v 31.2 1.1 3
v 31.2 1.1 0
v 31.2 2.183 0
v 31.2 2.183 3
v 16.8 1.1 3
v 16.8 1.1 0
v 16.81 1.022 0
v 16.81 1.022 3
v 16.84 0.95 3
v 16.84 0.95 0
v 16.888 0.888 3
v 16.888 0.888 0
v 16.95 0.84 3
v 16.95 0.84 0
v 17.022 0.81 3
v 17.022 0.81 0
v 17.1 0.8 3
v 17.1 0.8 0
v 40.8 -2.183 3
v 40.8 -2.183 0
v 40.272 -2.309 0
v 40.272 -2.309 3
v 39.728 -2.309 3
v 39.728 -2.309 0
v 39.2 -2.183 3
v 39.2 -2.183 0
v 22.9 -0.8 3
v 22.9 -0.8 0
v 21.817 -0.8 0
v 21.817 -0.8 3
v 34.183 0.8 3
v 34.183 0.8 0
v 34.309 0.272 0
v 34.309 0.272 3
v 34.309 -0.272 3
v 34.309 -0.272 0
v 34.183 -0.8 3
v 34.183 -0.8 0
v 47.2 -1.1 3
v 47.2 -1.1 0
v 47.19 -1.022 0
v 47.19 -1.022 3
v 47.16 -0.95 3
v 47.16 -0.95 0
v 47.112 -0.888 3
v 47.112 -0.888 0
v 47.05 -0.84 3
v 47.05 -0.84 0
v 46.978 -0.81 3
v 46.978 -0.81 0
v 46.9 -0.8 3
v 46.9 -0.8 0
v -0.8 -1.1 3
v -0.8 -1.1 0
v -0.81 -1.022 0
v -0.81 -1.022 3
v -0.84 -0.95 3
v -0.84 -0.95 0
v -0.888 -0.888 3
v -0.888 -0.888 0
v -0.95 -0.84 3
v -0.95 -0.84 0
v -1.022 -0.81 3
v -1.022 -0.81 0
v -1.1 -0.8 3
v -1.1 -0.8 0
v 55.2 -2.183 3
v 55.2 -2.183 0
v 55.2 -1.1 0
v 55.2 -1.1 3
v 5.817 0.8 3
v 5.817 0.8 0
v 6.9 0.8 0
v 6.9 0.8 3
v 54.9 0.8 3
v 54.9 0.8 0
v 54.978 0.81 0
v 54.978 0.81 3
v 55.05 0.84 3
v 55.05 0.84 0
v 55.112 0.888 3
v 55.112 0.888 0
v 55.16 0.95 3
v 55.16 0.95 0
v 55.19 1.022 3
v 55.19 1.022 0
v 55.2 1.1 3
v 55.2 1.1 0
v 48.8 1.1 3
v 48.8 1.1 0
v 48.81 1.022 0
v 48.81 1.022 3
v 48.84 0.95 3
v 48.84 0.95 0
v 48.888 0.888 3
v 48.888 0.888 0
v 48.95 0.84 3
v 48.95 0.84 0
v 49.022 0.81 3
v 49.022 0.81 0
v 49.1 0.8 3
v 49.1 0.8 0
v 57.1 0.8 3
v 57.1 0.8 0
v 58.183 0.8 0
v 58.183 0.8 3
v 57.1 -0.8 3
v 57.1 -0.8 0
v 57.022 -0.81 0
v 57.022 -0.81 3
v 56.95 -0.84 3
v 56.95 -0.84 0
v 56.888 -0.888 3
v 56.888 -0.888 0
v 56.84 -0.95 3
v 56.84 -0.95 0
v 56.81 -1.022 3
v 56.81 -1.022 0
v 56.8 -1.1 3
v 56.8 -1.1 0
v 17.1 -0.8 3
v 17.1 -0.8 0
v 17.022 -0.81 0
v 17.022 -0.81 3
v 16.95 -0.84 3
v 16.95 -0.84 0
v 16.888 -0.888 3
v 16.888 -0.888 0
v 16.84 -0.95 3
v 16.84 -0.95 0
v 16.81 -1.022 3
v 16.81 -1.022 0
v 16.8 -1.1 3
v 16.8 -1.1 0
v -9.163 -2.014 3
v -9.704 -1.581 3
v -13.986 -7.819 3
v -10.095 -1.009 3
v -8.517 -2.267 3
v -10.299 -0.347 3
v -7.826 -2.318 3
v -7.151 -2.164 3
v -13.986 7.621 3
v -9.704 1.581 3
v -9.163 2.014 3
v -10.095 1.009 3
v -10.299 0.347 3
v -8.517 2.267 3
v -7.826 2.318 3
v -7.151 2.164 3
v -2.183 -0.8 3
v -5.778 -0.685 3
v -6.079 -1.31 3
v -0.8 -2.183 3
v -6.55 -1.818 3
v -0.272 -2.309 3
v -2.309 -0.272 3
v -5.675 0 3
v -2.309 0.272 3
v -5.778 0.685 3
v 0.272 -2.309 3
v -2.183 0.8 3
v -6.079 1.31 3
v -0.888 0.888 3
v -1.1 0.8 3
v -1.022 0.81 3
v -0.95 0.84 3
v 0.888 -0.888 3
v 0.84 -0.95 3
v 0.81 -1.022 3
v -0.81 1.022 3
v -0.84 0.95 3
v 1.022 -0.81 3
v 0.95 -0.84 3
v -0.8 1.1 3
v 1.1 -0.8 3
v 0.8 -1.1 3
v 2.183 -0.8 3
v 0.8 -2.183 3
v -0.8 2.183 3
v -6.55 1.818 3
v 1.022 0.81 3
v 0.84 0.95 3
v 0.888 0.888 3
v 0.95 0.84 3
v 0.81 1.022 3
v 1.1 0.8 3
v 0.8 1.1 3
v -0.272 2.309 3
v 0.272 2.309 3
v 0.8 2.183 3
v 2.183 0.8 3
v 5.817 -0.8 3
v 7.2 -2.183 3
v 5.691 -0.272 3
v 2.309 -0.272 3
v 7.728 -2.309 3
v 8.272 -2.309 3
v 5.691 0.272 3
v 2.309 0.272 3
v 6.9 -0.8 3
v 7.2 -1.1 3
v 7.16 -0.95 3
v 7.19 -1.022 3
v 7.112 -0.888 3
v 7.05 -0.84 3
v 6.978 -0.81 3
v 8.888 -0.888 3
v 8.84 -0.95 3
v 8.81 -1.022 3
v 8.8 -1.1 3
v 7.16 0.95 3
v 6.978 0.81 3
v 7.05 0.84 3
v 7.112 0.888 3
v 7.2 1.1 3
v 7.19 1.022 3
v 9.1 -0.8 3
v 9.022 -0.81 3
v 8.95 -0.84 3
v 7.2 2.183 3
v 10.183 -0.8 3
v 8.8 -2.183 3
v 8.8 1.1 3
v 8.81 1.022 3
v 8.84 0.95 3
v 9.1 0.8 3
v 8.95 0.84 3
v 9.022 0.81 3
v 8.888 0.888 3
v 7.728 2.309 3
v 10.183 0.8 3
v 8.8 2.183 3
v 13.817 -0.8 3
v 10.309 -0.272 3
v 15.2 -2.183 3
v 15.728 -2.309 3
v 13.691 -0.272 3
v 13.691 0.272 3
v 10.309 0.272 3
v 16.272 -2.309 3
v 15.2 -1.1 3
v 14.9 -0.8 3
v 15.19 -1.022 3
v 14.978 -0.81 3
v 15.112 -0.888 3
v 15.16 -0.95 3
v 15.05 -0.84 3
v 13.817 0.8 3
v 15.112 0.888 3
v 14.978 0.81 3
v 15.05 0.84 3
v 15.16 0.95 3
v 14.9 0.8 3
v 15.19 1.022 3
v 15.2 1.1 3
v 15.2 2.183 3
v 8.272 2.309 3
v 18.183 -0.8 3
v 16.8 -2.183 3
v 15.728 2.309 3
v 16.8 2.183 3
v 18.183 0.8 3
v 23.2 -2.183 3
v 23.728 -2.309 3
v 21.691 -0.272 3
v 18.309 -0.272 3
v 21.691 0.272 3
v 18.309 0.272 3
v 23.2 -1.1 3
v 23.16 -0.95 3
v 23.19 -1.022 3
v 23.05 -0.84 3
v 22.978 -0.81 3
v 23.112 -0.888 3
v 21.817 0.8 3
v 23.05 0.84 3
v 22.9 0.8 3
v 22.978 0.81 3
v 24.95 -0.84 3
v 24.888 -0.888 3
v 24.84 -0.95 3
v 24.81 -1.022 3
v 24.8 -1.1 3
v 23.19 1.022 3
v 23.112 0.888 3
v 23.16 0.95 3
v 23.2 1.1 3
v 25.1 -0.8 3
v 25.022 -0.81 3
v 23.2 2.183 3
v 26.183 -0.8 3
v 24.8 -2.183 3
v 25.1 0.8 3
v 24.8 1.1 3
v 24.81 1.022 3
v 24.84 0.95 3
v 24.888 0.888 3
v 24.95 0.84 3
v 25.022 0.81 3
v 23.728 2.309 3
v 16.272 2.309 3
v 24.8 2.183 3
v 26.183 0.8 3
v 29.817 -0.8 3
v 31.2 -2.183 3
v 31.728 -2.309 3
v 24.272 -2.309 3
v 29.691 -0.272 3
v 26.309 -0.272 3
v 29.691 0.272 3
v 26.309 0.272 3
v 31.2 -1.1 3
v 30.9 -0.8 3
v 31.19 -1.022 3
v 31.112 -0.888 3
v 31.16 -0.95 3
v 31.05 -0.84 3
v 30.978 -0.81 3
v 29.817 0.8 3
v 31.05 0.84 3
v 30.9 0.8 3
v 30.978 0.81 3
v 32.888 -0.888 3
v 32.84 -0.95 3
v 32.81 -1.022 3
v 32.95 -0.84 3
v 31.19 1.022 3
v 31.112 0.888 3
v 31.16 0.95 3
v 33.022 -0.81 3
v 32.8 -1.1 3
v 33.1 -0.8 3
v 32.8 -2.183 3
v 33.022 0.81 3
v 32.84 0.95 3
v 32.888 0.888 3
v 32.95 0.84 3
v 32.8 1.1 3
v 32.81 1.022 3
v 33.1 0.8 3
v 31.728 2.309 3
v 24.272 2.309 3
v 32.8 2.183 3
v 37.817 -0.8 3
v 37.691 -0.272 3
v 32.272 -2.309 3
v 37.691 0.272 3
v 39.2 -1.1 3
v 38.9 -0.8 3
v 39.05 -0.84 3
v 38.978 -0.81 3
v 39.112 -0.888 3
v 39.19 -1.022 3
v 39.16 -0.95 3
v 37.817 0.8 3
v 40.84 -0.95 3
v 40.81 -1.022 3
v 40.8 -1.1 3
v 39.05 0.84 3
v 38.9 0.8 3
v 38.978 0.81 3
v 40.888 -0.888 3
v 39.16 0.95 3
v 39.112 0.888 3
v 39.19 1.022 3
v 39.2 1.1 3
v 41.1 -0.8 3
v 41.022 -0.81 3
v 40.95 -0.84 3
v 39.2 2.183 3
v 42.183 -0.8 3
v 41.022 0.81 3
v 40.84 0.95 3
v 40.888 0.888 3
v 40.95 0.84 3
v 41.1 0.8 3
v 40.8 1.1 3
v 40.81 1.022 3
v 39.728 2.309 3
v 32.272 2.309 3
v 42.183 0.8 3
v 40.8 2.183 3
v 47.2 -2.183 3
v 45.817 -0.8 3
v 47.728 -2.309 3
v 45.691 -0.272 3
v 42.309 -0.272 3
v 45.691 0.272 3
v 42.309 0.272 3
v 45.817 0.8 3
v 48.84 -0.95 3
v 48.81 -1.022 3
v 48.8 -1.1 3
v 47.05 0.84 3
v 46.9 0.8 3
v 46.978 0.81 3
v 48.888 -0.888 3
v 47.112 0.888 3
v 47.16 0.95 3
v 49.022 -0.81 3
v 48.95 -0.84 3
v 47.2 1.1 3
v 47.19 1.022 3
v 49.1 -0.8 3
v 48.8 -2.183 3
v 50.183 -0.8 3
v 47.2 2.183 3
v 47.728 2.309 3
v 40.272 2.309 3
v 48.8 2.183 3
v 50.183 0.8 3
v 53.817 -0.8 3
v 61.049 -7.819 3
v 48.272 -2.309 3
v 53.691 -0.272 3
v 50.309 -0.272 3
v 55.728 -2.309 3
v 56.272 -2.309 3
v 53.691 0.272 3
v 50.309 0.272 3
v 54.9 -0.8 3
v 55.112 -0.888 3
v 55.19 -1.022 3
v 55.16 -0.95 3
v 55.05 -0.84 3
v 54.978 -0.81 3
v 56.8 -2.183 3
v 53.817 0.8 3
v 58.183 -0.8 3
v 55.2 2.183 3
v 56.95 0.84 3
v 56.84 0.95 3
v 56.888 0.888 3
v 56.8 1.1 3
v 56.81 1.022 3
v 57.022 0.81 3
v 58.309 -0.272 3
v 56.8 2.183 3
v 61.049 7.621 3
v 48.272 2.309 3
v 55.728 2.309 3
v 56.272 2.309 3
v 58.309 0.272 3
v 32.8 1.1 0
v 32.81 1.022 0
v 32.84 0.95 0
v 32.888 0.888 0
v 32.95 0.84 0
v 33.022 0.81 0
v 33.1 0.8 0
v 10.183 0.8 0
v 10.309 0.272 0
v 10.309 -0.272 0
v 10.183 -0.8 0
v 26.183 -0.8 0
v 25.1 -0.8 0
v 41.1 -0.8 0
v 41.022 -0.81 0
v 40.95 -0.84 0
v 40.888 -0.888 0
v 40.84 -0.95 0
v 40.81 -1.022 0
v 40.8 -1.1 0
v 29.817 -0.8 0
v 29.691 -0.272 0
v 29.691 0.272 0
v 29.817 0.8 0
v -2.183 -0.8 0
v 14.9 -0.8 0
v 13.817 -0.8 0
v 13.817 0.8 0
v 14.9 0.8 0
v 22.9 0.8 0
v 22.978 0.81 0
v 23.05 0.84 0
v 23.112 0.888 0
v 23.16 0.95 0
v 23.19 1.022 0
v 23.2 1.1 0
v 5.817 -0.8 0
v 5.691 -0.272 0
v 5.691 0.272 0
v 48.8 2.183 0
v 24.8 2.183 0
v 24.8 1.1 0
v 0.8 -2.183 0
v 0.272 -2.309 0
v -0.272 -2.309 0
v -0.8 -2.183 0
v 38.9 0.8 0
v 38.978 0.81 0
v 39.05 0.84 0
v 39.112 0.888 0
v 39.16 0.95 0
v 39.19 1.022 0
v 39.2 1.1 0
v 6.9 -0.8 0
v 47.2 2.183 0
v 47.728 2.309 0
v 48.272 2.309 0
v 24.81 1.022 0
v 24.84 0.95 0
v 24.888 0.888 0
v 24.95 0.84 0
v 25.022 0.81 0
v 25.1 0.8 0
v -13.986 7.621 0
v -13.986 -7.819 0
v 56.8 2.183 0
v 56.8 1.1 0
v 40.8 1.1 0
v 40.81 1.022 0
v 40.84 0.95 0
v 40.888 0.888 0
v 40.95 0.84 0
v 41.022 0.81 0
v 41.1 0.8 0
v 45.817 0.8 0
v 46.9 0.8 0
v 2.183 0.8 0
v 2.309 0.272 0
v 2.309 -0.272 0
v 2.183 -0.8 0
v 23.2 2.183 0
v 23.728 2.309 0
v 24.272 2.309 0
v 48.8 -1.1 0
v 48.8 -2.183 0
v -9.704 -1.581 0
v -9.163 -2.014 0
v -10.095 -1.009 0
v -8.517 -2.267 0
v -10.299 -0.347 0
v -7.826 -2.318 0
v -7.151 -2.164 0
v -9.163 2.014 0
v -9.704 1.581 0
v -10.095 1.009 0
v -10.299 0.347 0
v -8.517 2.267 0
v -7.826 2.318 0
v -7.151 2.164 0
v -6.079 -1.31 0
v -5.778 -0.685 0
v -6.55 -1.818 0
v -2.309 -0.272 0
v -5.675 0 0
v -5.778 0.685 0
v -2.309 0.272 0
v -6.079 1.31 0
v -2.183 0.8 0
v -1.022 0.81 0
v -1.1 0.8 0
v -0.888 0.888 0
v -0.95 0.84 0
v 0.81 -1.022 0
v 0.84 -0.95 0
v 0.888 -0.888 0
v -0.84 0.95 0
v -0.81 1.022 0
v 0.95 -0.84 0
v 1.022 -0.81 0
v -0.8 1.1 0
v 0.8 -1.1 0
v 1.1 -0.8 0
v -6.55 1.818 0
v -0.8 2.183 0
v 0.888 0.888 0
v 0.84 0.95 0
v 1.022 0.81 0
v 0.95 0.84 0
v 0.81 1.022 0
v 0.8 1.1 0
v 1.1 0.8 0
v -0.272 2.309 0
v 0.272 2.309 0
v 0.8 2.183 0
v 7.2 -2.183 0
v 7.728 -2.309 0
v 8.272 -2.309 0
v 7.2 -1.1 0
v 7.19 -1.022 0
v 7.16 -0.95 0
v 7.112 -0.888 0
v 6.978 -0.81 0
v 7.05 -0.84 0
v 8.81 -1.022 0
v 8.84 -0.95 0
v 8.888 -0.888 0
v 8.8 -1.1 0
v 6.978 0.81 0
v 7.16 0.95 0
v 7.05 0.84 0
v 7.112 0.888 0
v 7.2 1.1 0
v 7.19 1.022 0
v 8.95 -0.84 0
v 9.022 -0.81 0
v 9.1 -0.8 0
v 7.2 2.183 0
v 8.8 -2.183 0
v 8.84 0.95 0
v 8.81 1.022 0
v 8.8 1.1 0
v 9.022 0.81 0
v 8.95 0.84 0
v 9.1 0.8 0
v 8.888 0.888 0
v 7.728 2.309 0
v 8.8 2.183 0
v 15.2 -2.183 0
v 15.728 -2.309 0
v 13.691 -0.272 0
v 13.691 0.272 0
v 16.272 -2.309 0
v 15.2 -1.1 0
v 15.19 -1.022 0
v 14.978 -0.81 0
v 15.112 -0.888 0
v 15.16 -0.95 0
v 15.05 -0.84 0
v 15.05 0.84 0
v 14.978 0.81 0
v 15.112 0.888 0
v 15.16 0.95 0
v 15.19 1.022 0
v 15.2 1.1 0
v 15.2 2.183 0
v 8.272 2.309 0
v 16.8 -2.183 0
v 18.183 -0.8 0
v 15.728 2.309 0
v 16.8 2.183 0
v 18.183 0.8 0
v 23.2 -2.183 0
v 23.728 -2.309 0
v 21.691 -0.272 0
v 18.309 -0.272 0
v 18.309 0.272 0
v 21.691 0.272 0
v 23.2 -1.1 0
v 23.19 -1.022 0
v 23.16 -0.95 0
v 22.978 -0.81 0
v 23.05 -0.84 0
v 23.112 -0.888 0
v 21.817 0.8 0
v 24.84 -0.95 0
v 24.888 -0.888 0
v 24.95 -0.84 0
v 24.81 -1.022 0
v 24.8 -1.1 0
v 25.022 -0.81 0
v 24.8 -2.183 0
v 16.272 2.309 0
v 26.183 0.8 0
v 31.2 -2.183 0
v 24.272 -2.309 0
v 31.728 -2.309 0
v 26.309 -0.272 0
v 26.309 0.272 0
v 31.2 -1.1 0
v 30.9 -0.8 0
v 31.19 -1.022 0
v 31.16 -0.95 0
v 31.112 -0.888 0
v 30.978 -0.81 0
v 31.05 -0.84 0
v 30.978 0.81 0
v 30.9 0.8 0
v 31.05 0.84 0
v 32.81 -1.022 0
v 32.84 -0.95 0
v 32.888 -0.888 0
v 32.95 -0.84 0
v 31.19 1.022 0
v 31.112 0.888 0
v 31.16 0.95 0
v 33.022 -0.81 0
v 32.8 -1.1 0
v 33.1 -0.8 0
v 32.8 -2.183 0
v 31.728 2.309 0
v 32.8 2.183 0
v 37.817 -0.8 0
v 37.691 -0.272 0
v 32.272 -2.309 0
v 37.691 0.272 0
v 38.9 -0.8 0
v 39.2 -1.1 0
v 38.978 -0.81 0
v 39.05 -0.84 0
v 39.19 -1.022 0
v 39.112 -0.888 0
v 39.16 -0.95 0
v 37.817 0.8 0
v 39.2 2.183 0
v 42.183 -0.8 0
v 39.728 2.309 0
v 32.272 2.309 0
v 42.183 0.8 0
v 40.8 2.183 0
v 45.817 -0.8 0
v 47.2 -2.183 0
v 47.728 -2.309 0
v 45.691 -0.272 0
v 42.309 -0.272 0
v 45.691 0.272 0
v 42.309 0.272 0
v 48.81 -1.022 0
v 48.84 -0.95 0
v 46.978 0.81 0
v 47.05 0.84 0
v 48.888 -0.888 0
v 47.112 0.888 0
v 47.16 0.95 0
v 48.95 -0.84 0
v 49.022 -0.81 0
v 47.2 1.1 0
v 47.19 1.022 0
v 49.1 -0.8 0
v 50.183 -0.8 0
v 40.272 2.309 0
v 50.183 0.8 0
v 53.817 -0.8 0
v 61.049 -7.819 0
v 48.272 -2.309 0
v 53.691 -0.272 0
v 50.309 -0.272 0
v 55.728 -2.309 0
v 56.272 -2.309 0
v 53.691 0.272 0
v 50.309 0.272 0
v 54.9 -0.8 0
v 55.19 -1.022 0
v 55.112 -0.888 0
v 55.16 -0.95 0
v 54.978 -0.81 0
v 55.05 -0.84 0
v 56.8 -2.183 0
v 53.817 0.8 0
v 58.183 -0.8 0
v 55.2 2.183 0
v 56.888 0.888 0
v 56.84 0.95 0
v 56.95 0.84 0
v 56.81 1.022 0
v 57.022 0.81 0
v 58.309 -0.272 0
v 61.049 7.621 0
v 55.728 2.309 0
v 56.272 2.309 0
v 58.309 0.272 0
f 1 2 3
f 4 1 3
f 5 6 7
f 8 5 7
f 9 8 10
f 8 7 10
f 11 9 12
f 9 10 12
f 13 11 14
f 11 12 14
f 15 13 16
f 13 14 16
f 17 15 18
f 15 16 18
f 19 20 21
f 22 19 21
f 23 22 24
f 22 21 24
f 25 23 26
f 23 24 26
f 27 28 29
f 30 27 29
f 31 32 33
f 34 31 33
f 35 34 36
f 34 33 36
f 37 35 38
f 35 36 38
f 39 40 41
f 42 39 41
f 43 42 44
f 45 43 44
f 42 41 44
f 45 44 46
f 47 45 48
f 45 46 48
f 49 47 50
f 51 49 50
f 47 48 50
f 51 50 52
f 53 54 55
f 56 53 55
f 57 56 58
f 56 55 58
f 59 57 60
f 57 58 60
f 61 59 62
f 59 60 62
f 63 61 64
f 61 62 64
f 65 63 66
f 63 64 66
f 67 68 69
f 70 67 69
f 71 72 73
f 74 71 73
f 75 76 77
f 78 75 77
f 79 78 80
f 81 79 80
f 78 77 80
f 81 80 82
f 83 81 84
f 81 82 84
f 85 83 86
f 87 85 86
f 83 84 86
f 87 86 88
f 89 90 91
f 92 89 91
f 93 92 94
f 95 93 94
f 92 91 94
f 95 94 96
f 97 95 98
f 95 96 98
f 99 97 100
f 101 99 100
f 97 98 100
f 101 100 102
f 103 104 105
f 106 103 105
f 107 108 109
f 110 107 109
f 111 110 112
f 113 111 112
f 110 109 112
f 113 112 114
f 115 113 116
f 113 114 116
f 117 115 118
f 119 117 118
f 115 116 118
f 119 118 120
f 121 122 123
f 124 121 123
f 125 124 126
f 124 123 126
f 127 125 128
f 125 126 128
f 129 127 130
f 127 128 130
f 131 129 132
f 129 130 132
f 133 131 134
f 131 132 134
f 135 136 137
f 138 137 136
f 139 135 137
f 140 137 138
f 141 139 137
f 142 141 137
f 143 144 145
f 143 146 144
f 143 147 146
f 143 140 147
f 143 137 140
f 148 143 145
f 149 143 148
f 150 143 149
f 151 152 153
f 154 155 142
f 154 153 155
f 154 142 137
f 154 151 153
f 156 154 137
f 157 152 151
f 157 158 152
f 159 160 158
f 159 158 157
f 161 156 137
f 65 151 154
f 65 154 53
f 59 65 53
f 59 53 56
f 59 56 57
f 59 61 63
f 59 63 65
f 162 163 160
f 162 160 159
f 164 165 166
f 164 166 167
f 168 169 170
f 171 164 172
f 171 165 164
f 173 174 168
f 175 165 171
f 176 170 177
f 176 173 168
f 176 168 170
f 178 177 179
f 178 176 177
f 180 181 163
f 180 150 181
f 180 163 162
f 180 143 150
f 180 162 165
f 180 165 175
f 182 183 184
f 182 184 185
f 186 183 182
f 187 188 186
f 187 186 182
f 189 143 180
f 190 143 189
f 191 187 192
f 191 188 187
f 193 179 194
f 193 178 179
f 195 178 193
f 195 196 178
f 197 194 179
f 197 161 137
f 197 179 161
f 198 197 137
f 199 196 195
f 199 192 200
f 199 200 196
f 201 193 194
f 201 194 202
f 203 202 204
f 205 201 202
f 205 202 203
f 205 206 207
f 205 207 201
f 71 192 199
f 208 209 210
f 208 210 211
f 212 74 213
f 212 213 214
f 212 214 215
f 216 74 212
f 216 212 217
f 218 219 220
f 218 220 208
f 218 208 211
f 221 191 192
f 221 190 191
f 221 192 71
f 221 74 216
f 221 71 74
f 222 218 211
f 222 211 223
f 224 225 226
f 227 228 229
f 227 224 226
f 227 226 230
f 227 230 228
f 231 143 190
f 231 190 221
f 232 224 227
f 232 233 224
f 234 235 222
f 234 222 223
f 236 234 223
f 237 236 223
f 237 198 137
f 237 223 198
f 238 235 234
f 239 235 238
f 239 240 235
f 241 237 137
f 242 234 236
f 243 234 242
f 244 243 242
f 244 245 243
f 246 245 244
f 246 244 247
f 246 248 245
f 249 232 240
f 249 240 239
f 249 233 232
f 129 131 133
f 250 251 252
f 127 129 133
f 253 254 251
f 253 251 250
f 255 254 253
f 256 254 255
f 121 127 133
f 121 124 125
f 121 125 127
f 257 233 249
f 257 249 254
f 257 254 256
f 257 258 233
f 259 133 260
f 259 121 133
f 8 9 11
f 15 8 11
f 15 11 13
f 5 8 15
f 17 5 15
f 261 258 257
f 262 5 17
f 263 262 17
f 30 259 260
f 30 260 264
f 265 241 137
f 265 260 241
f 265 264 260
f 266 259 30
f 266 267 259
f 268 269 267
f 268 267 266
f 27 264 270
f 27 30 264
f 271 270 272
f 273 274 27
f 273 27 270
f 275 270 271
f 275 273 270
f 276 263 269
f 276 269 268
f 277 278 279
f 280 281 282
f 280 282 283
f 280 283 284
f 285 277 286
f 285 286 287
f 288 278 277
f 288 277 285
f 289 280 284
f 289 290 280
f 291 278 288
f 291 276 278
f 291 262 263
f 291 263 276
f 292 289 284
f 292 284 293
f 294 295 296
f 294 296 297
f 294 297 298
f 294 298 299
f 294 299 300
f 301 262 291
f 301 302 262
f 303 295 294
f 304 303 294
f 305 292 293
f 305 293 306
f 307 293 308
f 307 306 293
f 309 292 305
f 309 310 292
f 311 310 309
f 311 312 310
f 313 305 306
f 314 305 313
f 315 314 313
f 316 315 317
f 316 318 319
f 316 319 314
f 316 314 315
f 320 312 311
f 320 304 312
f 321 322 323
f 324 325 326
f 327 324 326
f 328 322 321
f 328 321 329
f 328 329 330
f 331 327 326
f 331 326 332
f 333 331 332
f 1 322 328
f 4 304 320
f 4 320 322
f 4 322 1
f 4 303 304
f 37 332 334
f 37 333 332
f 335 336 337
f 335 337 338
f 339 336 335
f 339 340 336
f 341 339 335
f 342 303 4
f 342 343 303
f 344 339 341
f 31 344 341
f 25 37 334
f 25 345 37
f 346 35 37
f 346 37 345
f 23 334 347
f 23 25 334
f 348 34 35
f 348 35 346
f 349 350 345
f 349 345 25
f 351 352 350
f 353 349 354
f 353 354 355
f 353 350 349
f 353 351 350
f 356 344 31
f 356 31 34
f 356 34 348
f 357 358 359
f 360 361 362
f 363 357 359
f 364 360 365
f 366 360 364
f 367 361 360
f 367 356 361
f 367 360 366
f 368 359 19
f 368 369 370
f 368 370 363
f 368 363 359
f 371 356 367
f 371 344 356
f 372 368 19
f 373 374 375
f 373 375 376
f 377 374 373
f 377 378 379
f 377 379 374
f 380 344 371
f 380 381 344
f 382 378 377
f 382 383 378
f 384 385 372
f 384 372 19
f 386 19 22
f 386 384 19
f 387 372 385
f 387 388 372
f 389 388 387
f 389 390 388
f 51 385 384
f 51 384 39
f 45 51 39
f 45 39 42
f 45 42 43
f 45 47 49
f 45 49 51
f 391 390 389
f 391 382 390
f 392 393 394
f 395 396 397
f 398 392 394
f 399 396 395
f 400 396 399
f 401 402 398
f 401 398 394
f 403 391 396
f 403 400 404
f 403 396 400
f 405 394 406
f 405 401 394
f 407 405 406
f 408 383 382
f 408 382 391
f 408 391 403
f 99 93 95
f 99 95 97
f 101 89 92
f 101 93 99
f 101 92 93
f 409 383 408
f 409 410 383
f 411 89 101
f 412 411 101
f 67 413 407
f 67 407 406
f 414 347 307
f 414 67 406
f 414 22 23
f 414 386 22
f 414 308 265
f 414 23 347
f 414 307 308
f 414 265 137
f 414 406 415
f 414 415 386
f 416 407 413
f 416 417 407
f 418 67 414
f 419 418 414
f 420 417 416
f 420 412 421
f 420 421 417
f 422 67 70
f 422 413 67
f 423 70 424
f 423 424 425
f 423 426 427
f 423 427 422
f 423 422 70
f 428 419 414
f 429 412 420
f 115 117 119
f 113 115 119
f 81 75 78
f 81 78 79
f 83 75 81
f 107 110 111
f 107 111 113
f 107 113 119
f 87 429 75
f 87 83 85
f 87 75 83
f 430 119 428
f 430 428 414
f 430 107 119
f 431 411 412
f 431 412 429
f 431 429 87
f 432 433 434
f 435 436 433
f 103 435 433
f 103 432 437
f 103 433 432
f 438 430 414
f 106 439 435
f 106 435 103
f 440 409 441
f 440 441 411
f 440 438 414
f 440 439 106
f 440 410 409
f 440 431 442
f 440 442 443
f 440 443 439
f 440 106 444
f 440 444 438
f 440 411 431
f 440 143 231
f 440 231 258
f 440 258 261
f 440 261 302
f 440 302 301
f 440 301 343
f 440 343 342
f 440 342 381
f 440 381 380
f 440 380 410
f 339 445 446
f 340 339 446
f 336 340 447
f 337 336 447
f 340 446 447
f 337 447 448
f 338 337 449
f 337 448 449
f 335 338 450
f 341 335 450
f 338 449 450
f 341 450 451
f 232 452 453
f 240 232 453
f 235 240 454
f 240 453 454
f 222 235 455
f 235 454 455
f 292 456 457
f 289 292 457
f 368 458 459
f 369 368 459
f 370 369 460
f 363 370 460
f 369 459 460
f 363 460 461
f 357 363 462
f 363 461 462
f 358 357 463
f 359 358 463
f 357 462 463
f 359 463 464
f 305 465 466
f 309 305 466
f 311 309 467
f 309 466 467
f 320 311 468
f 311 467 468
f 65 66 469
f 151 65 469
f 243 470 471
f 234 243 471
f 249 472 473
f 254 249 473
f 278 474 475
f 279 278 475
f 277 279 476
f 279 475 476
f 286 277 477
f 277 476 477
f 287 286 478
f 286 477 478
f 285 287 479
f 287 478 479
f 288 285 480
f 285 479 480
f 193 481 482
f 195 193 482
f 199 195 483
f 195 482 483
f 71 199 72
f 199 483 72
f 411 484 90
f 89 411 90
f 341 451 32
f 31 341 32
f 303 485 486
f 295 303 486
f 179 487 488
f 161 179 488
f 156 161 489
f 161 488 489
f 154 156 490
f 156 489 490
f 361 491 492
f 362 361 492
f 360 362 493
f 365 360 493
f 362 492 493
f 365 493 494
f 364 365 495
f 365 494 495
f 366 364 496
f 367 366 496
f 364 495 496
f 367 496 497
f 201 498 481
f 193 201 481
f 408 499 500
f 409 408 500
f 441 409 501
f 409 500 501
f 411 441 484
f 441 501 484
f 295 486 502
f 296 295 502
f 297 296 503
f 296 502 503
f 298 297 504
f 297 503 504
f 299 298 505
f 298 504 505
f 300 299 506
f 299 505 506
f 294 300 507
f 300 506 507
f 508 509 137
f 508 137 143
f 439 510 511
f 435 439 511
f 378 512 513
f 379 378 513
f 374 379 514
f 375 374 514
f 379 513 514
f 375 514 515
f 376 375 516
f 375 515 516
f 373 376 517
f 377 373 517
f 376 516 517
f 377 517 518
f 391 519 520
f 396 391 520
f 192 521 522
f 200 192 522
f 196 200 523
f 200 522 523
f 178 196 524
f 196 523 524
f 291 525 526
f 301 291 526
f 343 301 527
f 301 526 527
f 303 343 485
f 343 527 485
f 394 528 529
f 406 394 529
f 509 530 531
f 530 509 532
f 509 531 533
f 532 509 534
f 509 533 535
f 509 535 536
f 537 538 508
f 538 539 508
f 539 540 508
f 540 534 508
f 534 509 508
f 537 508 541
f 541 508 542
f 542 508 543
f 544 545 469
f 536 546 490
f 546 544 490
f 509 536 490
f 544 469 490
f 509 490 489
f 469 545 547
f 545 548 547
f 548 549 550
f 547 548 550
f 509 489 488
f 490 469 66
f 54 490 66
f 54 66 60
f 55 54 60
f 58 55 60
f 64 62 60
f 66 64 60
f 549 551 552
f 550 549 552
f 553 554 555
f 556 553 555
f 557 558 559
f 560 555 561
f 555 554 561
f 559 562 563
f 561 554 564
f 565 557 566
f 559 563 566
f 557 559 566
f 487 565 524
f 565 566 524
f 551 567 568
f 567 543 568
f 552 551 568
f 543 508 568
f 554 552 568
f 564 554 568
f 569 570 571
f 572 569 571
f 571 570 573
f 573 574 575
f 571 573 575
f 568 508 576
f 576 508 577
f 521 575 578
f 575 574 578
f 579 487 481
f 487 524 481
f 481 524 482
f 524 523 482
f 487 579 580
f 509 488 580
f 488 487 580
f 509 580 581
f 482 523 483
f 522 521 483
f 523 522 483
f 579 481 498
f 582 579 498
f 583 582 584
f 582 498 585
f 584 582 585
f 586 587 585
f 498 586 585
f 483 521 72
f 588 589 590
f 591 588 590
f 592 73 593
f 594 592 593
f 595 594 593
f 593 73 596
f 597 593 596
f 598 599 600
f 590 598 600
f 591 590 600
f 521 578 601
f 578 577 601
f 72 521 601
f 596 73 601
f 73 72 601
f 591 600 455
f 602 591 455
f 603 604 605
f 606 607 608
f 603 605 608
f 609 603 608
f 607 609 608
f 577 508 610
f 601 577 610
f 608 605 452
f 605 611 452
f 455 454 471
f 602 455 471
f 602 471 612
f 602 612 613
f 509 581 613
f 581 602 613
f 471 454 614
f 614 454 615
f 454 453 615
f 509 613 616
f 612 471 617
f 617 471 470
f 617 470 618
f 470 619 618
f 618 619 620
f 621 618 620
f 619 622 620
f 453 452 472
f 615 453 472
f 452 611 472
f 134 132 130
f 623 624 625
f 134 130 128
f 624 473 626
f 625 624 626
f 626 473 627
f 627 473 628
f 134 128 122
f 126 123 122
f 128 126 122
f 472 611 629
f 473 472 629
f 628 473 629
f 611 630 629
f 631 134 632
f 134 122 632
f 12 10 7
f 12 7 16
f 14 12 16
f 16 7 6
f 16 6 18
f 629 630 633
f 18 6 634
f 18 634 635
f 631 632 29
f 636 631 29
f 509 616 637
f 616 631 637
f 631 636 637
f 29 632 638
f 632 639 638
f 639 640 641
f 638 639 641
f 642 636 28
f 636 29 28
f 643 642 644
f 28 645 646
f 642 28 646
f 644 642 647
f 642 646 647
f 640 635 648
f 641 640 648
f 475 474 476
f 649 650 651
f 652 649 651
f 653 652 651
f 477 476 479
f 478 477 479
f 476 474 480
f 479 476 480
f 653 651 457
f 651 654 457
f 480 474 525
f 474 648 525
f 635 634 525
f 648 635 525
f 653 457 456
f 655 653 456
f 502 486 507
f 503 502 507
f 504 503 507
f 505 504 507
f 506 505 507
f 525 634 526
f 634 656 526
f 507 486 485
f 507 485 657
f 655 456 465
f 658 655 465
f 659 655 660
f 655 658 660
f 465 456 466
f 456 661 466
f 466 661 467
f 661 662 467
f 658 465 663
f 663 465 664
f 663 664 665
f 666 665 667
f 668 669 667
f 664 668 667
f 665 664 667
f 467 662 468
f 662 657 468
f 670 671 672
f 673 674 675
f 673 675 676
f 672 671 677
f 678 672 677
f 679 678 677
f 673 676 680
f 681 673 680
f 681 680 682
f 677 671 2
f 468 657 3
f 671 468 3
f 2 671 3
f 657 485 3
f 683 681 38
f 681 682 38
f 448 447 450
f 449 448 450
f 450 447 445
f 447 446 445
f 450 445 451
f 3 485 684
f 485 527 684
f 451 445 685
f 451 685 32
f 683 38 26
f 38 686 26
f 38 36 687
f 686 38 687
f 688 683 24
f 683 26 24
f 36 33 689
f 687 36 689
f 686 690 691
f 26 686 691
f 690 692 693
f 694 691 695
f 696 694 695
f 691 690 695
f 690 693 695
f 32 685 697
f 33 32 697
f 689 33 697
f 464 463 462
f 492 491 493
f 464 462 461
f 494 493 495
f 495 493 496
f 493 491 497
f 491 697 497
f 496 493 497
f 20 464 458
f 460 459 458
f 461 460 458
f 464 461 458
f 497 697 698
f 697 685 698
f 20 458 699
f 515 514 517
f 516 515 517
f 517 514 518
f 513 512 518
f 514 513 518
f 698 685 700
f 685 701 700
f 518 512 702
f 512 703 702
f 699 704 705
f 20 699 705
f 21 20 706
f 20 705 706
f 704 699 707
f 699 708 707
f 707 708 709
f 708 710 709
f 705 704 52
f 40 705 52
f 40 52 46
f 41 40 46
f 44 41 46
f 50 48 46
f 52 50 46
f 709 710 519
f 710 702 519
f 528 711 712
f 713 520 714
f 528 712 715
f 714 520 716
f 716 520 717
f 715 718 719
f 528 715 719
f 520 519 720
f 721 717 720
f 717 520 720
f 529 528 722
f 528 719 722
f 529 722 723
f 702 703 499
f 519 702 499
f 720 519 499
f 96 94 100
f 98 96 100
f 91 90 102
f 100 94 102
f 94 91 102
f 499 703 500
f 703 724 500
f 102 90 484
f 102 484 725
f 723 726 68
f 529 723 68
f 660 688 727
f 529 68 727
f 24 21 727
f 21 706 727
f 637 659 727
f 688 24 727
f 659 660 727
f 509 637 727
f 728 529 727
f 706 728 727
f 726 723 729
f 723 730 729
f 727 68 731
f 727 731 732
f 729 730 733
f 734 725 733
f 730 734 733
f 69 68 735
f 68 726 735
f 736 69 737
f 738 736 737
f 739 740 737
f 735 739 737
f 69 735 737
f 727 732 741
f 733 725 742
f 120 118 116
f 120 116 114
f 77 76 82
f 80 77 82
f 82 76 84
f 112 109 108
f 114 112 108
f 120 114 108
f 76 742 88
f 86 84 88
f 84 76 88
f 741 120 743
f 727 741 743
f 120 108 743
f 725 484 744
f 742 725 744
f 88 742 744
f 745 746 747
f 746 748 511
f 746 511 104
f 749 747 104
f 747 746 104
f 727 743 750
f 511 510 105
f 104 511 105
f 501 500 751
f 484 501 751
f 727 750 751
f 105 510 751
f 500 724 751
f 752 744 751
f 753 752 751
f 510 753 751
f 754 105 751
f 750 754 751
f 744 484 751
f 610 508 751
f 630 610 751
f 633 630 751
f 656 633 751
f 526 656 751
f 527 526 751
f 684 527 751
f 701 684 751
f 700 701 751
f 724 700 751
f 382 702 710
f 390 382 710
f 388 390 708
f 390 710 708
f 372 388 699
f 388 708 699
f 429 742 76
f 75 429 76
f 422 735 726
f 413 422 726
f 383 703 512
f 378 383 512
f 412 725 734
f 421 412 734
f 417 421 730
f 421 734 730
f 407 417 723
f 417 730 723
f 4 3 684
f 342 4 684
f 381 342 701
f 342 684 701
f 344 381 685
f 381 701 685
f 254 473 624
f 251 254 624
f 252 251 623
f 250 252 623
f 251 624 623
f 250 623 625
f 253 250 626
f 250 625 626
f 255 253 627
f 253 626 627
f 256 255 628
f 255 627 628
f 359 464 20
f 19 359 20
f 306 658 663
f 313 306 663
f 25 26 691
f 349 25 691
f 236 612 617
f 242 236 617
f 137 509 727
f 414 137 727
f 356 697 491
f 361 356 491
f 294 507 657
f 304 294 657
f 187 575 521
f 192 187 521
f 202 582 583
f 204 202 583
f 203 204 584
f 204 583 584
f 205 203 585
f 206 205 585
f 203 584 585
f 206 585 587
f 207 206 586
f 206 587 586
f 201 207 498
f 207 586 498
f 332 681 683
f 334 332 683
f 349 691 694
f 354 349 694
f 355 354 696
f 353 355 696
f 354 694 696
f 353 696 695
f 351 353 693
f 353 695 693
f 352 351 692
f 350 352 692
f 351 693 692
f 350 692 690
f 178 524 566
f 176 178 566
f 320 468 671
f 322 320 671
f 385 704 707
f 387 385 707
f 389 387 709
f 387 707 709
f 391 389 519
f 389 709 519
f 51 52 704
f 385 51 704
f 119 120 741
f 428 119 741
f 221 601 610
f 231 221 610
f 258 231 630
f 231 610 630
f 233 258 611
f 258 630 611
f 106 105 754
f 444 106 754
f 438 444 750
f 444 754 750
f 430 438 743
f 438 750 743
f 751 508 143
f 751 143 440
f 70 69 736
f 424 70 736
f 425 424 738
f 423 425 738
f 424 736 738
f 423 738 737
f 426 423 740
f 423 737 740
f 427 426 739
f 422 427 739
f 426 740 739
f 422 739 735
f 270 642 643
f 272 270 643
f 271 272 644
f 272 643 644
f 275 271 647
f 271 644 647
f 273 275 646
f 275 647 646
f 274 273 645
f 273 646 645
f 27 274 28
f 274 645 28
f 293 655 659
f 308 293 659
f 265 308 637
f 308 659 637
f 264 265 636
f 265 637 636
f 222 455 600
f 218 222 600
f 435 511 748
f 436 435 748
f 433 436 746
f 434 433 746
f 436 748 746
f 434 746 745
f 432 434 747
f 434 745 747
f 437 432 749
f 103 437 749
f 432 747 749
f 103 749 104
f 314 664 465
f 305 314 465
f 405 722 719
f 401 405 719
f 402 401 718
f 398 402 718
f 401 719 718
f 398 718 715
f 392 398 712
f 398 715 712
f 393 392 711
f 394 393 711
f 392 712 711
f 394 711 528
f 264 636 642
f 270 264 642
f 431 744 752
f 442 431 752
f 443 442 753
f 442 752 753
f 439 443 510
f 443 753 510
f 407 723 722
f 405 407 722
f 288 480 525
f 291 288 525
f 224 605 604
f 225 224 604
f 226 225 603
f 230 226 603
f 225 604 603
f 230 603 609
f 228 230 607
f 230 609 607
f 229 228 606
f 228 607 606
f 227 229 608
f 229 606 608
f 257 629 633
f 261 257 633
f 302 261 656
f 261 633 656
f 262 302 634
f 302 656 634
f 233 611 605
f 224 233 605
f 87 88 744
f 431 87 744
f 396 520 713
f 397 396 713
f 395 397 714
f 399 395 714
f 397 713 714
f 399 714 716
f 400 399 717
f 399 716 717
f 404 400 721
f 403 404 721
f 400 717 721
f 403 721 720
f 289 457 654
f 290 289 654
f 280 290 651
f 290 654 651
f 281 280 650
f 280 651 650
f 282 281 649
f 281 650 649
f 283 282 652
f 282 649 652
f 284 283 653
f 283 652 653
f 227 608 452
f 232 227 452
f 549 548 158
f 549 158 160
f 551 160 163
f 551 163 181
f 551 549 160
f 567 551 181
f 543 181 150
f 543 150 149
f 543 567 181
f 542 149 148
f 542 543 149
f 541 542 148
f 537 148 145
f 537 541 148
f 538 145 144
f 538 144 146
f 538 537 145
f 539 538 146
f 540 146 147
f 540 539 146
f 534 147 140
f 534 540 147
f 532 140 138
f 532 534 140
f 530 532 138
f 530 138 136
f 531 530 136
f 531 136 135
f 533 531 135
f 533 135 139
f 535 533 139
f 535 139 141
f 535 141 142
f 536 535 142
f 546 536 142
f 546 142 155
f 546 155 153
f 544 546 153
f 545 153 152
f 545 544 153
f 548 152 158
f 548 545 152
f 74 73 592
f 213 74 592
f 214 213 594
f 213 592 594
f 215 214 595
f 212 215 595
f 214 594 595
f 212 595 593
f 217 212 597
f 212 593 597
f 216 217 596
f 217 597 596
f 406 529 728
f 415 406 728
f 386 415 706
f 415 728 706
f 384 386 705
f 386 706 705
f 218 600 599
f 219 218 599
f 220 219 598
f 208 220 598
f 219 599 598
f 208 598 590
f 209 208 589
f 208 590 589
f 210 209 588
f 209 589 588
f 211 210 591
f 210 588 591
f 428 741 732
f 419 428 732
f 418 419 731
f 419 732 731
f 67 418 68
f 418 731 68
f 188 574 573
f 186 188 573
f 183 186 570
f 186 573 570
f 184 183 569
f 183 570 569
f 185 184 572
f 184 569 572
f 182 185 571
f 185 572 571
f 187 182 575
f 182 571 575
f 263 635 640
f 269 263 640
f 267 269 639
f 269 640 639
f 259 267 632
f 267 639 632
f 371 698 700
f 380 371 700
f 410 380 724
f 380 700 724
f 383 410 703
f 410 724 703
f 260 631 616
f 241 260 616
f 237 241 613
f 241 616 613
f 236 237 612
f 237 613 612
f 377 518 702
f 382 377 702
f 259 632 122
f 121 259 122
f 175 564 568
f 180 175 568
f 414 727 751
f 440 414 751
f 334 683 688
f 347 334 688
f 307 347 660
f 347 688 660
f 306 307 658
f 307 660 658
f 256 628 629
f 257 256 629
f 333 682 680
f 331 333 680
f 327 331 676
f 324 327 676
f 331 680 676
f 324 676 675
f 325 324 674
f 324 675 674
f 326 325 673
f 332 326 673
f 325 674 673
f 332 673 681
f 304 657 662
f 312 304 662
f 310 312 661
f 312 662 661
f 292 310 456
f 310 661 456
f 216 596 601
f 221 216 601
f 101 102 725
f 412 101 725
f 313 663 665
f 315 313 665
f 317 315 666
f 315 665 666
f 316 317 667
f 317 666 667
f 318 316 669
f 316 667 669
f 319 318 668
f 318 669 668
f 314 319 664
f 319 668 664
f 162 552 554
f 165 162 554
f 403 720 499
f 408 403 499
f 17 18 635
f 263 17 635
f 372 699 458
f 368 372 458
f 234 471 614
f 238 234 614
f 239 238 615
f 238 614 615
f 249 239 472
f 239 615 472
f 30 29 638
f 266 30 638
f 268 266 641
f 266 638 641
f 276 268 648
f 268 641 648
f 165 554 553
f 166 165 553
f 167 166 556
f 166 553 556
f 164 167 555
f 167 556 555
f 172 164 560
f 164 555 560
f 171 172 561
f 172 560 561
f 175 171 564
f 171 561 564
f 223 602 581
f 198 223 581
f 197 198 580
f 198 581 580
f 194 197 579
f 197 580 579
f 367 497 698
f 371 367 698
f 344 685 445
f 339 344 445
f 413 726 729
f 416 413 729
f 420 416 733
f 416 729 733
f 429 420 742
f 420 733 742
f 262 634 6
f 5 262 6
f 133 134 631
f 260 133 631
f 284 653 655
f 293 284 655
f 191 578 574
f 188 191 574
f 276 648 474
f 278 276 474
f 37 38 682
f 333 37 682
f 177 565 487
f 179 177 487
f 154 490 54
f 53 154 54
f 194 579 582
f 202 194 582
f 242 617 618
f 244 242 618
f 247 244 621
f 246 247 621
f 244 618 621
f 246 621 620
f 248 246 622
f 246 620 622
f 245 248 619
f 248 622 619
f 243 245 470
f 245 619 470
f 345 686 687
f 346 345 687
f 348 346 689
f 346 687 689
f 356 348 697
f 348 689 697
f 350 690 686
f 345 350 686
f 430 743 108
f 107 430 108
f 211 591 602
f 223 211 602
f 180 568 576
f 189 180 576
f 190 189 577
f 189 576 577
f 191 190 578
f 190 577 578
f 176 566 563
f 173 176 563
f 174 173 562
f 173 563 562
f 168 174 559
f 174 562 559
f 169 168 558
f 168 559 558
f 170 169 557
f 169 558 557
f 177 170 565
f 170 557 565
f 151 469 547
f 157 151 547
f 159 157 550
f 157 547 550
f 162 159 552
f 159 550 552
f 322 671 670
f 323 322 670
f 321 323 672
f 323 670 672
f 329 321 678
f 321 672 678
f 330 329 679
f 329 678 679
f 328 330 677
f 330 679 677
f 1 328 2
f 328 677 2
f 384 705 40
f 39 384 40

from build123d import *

# Parameters (mm, degrees)
F0_W     = 75.035495
F0_H     = 15.439995
F0_R     = 2.325
F1_DEPTH = 3


with BuildPart() as f1:
    # F0 (on Top) → F1 (new body)
    with BuildSketch(Plane.XY):
        with Locations((23.531661, -0.09854)):
            Rectangle(F0_W, F0_H)
        with Locations((-8, 0)):
            Circle(F0_R, mode=Mode.SUBTRACT)
        with BuildLine():
            Line((0.8, 2.183031), (0.8, 1.1))
            ThreePointArc((0.8, 1.1), (0.887868, 0.887868), (1.1, 0.8))
            Line((1.1, 0.8), (2.183031, 0.8))
            ThreePointArc((2.183031, 0.8), (2.325, 0), (2.183031, -0.8))
            Line((2.183031, -0.8), (1.1, -0.8))
            ThreePointArc((1.1, -0.8), (0.887868, -0.887868), (0.8, -1.1))
            Line((0.8, -1.1), (0.8, -2.183031))
            ThreePointArc((0.8, -2.183031), (0, -2.325), (-0.8, -2.183031))
            Line((-0.8, -2.183031), (-0.8, -1.1))
            ThreePointArc((-0.8, -1.1), (-0.887868, -0.887868), (-1.1, -0.8))
            Line((-1.1, -0.8), (-2.183031, -0.8))
            ThreePointArc((-2.183031, -0.8), (-2.325, 0), (-2.183031, 0.8))
            Line((-2.183031, 0.8), (-1.1, 0.8))
            ThreePointArc((-1.1, 0.8), (-0.887868, 0.887868), (-0.8, 1.1))
            Line((-0.8, 1.1), (-0.8, 2.183031))
            ThreePointArc((-0.8, 2.183031), (0, 2.325), (0.8, 2.183031))
        make_face(mode=Mode.SUBTRACT)
        with BuildLine():
            ThreePointArc((8.8, -2.183031), (8, -2.325), (7.2, -2.183031))
            Line((7.2, -2.183031), (7.2, -1.1))
            ThreePointArc((7.2, -1.1), (7.112132, -0.887868), (6.9, -0.8))
            Line((6.9, -0.8), (5.816969, -0.8))
            ThreePointArc((5.816969, -0.8), (5.675, 0), (5.816969, 0.8))
            Line((5.816969, 0.8), (6.9, 0.8))
            ThreePointArc((6.9, 0.8), (7.112132, 0.887868), (7.2, 1.1))
            Line((7.2, 1.1), (7.2, 2.183031))
            ThreePointArc((7.2, 2.183031), (8, 2.325), (8.8, 2.183031))
            Line((8.8, 2.183031), (8.8, 1.1))
            ThreePointArc((8.8, 1.1), (8.887868, 0.887868), (9.1, 0.8))
            Line((9.1, 0.8), (10.183031, 0.8))
            ThreePointArc((10.183031, 0.8), (10.325, 0), (10.183031, -0.8))
            Line((10.183031, -0.8), (9.1, -0.8))
            ThreePointArc((9.1, -0.8), (8.887868, -0.887868), (8.8, -1.1))
            Line((8.8, -1.1), (8.8, -2.183031))
        make_face(mode=Mode.SUBTRACT)
        with BuildLine():
            ThreePointArc((16.8, -2.183031), (16, -2.325), (15.2, -2.183031))
            Line((15.2, -2.183031), (15.2, -1.1))
            ThreePointArc((15.2, -1.1), (15.112132, -0.887868), (14.9, -0.8))
            Line((14.9, -0.8), (13.816969, -0.8))
            ThreePointArc((13.816969, -0.8), (13.675, 0), (13.816969, 0.8))
            Line((13.816969, 0.8), (14.9, 0.8))
            ThreePointArc((14.9, 0.8), (15.112132, 0.887868), (15.2, 1.1))
            Line((15.2, 1.1), (15.2, 2.183031))
            ThreePointArc((15.2, 2.183031), (16, 2.325), (16.8, 2.183031))
            Line((16.8, 2.183031), (16.8, 1.1))
            ThreePointArc((16.8, 1.1), (16.887868, 0.887868), (17.1, 0.8))
            Line((17.1, 0.8), (18.183031, 0.8))
            ThreePointArc((18.183031, 0.8), (18.325, 0), (18.183031, -0.8))
            Line((18.183031, -0.8), (17.1, -0.8))
            ThreePointArc((17.1, -0.8), (16.887868, -0.887868), (16.8, -1.1))
            Line((16.8, -1.1), (16.8, -2.183031))
        make_face(mode=Mode.SUBTRACT)
        with BuildLine():
            ThreePointArc((24.8, -2.183031), (24, -2.325), (23.2, -2.183031))
            Line((23.2, -2.183031), (23.2, -1.1))
            ThreePointArc((23.2, -1.1), (23.112132, -0.887868), (22.9, -0.8))
            Line((22.9, -0.8), (21.816969, -0.8))
            ThreePointArc((21.816969, -0.8), (21.675, 0), (21.816969, 0.8))
            Line((21.816969, 0.8), (22.9, 0.8))
            ThreePointArc((22.9, 0.8), (23.112132, 0.887868), (23.2, 1.1))
            Line((23.2, 1.1), (23.2, 2.183031))
            ThreePointArc((23.2, 2.183031), (24, 2.325), (24.8, 2.183031))
            Line((24.8, 2.183031), (24.8, 1.1))
            ThreePointArc((24.8, 1.1), (24.887868, 0.887868), (25.1, 0.8))
            Line((25.1, 0.8), (26.183031, 0.8))
            ThreePointArc((26.183031, 0.8), (26.325, 0), (26.183031, -0.8))
            Line((26.183031, -0.8), (25.1, -0.8))
            ThreePointArc((25.1, -0.8), (24.887868, -0.887868), (24.8, -1.1))
            Line((24.8, -1.1), (24.8, -2.183031))
        make_face(mode=Mode.SUBTRACT)
        with BuildLine():
            ThreePointArc((32.8, -2.183031), (32, -2.325), (31.2, -2.183031))
            Line((31.2, -2.183031), (31.2, -1.1))
            ThreePointArc((31.2, -1.1), (31.112132, -0.887868), (30.9, -0.8))
            Line((30.9, -0.8), (29.816969, -0.8))
            ThreePointArc((29.816969, -0.8), (29.675, 0), (29.816969, 0.8))
            Line((29.816969, 0.8), (30.9, 0.8))
            ThreePointArc((30.9, 0.8), (31.112132, 0.887868), (31.2, 1.1))
            Line((31.2, 1.1), (31.2, 2.183031))
            ThreePointArc((31.2, 2.183031), (32, 2.325), (32.8, 2.183031))
            Line((32.8, 2.183031), (32.8, 1.1))
            ThreePointArc((32.8, 1.1), (32.887868, 0.887868), (33.1, 0.8))
            Line((33.1, 0.8), (34.183031, 0.8))
            ThreePointArc((34.183031, 0.8), (34.325, 0), (34.183031, -0.8))
            Line((34.183031, -0.8), (33.1, -0.8))
            ThreePointArc((33.1, -0.8), (32.887868, -0.887868), (32.8, -1.1))
            Line((32.8, -1.1), (32.8, -2.183031))
        make_face(mode=Mode.SUBTRACT)
        with BuildLine():
            ThreePointArc((40.8, -2.183031), (40, -2.325), (39.2, -2.183031))
            Line((39.2, -2.183031), (39.2, -1.1))
            ThreePointArc((39.2, -1.1), (39.112132, -0.887868), (38.9, -0.8))
            Line((38.9, -0.8), (37.816969, -0.8))
            ThreePointArc((37.816969, -0.8), (37.675, 0), (37.816969, 0.8))
            Line((37.816969, 0.8), (38.9, 0.8))
            ThreePointArc((38.9, 0.8), (39.112132, 0.887868), (39.2, 1.1))
            Line((39.2, 1.1), (39.2, 2.183031))
            ThreePointArc((39.2, 2.183031), (40, 2.325), (40.8, 2.183031))
            Line((40.8, 2.183031), (40.8, 1.1))
            ThreePointArc((40.8, 1.1), (40.887868, 0.887868), (41.1, 0.8))
            Line((41.1, 0.8), (42.183031, 0.8))
            ThreePointArc((42.183031, 0.8), (42.325, 0), (42.183031, -0.8))
            Line((42.183031, -0.8), (41.1, -0.8))
            ThreePointArc((41.1, -0.8), (40.887868, -0.887868), (40.8, -1.1))
            Line((40.8, -1.1), (40.8, -2.183031))
        make_face(mode=Mode.SUBTRACT)
        with BuildLine():
            ThreePointArc((48.8, -2.183031), (48, -2.325), (47.2, -2.183031))
            Line((47.2, -2.183031), (47.2, -1.1))
            ThreePointArc((47.2, -1.1), (47.112132, -0.887868), (46.9, -0.8))
            Line((46.9, -0.8), (45.816969, -0.8))
            ThreePointArc((45.816969, -0.8), (45.675, 0), (45.816969, 0.8))
            Line((45.816969, 0.8), (46.9, 0.8))
            ThreePointArc((46.9, 0.8), (47.112132, 0.887868), (47.2, 1.1))
            Line((47.2, 1.1), (47.2, 2.183031))
            ThreePointArc((47.2, 2.183031), (48, 2.325), (48.8, 2.183031))
            Line((48.8, 2.183031), (48.8, 1.1))
            ThreePointArc((48.8, 1.1), (48.887868, 0.887868), (49.1, 0.8))
            Line((49.1, 0.8), (50.183031, 0.8))
            ThreePointArc((50.183031, 0.8), (50.325, 0), (50.183031, -0.8))
            Line((50.183031, -0.8), (49.1, -0.8))
            ThreePointArc((49.1, -0.8), (48.887868, -0.887868), (48.8, -1.1))
            Line((48.8, -1.1), (48.8, -2.183031))
        make_face(mode=Mode.SUBTRACT)
        with BuildLine():
            ThreePointArc((56.8, -2.183031), (56, -2.325), (55.2, -2.183031))
            Line((55.2, -2.183031), (55.2, -1.1))
            ThreePointArc((55.2, -1.1), (55.112132, -0.887868), (54.9, -0.8))
            Line((54.9, -0.8), (53.816969, -0.8))
            ThreePointArc((53.816969, -0.8), (53.675, 0), (53.816969, 0.8))
            Line((53.816969, 0.8), (54.9, 0.8))
            ThreePointArc((54.9, 0.8), (55.112132, 0.887868), (55.2, 1.1))
            Line((55.2, 1.1), (55.2, 2.183031))
            ThreePointArc((55.2, 2.183031), (56, 2.325), (56.8, 2.183031))
            Line((56.8, 2.183031), (56.8, 1.1))
            ThreePointArc((56.8, 1.1), (56.887868, 0.887868), (57.1, 0.8))
            Line((57.1, 0.8), (58.183031, 0.8))
            ThreePointArc((58.183031, 0.8), (58.325, 0), (58.183031, -0.8))
            Line((58.183031, -0.8), (57.1, -0.8))
            ThreePointArc((57.1, -0.8), (56.887868, -0.887868), (56.8, -1.1))
            Line((56.8, -1.1), (56.8, -2.183031))
        make_face(mode=Mode.SUBTRACT)
    extrude(amount=F1_DEPTH)


solid = f1.part
